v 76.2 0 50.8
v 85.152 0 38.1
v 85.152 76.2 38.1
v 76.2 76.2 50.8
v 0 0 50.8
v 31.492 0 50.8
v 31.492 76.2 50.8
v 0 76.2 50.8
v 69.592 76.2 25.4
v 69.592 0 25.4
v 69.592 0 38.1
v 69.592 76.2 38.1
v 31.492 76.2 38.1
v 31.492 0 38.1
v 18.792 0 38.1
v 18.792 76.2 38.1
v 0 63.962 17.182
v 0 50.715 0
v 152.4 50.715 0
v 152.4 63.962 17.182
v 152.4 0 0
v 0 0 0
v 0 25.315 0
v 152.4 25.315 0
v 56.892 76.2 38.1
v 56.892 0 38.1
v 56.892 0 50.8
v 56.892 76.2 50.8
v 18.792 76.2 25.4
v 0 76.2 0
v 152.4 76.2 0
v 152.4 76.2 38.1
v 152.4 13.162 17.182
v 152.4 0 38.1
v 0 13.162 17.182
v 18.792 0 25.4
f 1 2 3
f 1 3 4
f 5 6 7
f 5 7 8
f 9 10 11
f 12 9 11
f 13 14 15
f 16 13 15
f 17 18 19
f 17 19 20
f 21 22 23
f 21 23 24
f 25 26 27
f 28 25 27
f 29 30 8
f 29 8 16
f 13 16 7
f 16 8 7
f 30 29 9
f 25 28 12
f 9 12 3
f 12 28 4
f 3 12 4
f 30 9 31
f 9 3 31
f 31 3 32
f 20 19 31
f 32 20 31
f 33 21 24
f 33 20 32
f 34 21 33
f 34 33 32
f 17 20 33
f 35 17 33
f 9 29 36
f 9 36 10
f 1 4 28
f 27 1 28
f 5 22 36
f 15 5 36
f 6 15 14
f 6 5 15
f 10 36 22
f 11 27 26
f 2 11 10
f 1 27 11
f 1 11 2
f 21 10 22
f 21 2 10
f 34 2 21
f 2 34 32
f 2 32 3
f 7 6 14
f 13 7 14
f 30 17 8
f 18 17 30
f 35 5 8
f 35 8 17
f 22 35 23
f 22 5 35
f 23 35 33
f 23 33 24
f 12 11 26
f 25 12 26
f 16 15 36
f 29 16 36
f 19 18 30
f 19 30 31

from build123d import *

# Parameters (mm, degrees)
F1_DEPTH = 76.2
F3_DEPTH = 76.2
F5_DEPTH = 152.4


with BuildPart() as f1:
    # F0 (on Front) → F1 (new body)
    with BuildSketch(Plane.XZ):
        Polygon((0, 50.8), (0, 0), (152.4, 0), (152.4, 38.1), (85.151714, 38.1), (76.2, 50.8), align=None)
    extrude(amount=-F1_DEPTH)

    # F2 (on face) → F3 (cut)
    with BuildSketch(Plane.XZ):
        Polygon((56.892031, 50.8), (31.492031, 50.8), (31.492031, 38.1), (18.792031, 38.1), (18.792031, 25.4), (69.592031, 25.4), (69.592031, 38.1), (56.892031, 38.1), align=None)
    extrude(amount=-F3_DEPTH, mode=Mode.SUBTRACT)

    # F4 (on face) → F5 (cut)
    with BuildSketch(Plane.YZ.offset(152.4)):
        Polygon((63.962197, 17.182477), (13.162197, 17.182477), (25.314642, 0), (50.714642, 0), align=None)
    extrude(amount=-F5_DEPTH, mode=Mode.SUBTRACT)


solid = f1.part
